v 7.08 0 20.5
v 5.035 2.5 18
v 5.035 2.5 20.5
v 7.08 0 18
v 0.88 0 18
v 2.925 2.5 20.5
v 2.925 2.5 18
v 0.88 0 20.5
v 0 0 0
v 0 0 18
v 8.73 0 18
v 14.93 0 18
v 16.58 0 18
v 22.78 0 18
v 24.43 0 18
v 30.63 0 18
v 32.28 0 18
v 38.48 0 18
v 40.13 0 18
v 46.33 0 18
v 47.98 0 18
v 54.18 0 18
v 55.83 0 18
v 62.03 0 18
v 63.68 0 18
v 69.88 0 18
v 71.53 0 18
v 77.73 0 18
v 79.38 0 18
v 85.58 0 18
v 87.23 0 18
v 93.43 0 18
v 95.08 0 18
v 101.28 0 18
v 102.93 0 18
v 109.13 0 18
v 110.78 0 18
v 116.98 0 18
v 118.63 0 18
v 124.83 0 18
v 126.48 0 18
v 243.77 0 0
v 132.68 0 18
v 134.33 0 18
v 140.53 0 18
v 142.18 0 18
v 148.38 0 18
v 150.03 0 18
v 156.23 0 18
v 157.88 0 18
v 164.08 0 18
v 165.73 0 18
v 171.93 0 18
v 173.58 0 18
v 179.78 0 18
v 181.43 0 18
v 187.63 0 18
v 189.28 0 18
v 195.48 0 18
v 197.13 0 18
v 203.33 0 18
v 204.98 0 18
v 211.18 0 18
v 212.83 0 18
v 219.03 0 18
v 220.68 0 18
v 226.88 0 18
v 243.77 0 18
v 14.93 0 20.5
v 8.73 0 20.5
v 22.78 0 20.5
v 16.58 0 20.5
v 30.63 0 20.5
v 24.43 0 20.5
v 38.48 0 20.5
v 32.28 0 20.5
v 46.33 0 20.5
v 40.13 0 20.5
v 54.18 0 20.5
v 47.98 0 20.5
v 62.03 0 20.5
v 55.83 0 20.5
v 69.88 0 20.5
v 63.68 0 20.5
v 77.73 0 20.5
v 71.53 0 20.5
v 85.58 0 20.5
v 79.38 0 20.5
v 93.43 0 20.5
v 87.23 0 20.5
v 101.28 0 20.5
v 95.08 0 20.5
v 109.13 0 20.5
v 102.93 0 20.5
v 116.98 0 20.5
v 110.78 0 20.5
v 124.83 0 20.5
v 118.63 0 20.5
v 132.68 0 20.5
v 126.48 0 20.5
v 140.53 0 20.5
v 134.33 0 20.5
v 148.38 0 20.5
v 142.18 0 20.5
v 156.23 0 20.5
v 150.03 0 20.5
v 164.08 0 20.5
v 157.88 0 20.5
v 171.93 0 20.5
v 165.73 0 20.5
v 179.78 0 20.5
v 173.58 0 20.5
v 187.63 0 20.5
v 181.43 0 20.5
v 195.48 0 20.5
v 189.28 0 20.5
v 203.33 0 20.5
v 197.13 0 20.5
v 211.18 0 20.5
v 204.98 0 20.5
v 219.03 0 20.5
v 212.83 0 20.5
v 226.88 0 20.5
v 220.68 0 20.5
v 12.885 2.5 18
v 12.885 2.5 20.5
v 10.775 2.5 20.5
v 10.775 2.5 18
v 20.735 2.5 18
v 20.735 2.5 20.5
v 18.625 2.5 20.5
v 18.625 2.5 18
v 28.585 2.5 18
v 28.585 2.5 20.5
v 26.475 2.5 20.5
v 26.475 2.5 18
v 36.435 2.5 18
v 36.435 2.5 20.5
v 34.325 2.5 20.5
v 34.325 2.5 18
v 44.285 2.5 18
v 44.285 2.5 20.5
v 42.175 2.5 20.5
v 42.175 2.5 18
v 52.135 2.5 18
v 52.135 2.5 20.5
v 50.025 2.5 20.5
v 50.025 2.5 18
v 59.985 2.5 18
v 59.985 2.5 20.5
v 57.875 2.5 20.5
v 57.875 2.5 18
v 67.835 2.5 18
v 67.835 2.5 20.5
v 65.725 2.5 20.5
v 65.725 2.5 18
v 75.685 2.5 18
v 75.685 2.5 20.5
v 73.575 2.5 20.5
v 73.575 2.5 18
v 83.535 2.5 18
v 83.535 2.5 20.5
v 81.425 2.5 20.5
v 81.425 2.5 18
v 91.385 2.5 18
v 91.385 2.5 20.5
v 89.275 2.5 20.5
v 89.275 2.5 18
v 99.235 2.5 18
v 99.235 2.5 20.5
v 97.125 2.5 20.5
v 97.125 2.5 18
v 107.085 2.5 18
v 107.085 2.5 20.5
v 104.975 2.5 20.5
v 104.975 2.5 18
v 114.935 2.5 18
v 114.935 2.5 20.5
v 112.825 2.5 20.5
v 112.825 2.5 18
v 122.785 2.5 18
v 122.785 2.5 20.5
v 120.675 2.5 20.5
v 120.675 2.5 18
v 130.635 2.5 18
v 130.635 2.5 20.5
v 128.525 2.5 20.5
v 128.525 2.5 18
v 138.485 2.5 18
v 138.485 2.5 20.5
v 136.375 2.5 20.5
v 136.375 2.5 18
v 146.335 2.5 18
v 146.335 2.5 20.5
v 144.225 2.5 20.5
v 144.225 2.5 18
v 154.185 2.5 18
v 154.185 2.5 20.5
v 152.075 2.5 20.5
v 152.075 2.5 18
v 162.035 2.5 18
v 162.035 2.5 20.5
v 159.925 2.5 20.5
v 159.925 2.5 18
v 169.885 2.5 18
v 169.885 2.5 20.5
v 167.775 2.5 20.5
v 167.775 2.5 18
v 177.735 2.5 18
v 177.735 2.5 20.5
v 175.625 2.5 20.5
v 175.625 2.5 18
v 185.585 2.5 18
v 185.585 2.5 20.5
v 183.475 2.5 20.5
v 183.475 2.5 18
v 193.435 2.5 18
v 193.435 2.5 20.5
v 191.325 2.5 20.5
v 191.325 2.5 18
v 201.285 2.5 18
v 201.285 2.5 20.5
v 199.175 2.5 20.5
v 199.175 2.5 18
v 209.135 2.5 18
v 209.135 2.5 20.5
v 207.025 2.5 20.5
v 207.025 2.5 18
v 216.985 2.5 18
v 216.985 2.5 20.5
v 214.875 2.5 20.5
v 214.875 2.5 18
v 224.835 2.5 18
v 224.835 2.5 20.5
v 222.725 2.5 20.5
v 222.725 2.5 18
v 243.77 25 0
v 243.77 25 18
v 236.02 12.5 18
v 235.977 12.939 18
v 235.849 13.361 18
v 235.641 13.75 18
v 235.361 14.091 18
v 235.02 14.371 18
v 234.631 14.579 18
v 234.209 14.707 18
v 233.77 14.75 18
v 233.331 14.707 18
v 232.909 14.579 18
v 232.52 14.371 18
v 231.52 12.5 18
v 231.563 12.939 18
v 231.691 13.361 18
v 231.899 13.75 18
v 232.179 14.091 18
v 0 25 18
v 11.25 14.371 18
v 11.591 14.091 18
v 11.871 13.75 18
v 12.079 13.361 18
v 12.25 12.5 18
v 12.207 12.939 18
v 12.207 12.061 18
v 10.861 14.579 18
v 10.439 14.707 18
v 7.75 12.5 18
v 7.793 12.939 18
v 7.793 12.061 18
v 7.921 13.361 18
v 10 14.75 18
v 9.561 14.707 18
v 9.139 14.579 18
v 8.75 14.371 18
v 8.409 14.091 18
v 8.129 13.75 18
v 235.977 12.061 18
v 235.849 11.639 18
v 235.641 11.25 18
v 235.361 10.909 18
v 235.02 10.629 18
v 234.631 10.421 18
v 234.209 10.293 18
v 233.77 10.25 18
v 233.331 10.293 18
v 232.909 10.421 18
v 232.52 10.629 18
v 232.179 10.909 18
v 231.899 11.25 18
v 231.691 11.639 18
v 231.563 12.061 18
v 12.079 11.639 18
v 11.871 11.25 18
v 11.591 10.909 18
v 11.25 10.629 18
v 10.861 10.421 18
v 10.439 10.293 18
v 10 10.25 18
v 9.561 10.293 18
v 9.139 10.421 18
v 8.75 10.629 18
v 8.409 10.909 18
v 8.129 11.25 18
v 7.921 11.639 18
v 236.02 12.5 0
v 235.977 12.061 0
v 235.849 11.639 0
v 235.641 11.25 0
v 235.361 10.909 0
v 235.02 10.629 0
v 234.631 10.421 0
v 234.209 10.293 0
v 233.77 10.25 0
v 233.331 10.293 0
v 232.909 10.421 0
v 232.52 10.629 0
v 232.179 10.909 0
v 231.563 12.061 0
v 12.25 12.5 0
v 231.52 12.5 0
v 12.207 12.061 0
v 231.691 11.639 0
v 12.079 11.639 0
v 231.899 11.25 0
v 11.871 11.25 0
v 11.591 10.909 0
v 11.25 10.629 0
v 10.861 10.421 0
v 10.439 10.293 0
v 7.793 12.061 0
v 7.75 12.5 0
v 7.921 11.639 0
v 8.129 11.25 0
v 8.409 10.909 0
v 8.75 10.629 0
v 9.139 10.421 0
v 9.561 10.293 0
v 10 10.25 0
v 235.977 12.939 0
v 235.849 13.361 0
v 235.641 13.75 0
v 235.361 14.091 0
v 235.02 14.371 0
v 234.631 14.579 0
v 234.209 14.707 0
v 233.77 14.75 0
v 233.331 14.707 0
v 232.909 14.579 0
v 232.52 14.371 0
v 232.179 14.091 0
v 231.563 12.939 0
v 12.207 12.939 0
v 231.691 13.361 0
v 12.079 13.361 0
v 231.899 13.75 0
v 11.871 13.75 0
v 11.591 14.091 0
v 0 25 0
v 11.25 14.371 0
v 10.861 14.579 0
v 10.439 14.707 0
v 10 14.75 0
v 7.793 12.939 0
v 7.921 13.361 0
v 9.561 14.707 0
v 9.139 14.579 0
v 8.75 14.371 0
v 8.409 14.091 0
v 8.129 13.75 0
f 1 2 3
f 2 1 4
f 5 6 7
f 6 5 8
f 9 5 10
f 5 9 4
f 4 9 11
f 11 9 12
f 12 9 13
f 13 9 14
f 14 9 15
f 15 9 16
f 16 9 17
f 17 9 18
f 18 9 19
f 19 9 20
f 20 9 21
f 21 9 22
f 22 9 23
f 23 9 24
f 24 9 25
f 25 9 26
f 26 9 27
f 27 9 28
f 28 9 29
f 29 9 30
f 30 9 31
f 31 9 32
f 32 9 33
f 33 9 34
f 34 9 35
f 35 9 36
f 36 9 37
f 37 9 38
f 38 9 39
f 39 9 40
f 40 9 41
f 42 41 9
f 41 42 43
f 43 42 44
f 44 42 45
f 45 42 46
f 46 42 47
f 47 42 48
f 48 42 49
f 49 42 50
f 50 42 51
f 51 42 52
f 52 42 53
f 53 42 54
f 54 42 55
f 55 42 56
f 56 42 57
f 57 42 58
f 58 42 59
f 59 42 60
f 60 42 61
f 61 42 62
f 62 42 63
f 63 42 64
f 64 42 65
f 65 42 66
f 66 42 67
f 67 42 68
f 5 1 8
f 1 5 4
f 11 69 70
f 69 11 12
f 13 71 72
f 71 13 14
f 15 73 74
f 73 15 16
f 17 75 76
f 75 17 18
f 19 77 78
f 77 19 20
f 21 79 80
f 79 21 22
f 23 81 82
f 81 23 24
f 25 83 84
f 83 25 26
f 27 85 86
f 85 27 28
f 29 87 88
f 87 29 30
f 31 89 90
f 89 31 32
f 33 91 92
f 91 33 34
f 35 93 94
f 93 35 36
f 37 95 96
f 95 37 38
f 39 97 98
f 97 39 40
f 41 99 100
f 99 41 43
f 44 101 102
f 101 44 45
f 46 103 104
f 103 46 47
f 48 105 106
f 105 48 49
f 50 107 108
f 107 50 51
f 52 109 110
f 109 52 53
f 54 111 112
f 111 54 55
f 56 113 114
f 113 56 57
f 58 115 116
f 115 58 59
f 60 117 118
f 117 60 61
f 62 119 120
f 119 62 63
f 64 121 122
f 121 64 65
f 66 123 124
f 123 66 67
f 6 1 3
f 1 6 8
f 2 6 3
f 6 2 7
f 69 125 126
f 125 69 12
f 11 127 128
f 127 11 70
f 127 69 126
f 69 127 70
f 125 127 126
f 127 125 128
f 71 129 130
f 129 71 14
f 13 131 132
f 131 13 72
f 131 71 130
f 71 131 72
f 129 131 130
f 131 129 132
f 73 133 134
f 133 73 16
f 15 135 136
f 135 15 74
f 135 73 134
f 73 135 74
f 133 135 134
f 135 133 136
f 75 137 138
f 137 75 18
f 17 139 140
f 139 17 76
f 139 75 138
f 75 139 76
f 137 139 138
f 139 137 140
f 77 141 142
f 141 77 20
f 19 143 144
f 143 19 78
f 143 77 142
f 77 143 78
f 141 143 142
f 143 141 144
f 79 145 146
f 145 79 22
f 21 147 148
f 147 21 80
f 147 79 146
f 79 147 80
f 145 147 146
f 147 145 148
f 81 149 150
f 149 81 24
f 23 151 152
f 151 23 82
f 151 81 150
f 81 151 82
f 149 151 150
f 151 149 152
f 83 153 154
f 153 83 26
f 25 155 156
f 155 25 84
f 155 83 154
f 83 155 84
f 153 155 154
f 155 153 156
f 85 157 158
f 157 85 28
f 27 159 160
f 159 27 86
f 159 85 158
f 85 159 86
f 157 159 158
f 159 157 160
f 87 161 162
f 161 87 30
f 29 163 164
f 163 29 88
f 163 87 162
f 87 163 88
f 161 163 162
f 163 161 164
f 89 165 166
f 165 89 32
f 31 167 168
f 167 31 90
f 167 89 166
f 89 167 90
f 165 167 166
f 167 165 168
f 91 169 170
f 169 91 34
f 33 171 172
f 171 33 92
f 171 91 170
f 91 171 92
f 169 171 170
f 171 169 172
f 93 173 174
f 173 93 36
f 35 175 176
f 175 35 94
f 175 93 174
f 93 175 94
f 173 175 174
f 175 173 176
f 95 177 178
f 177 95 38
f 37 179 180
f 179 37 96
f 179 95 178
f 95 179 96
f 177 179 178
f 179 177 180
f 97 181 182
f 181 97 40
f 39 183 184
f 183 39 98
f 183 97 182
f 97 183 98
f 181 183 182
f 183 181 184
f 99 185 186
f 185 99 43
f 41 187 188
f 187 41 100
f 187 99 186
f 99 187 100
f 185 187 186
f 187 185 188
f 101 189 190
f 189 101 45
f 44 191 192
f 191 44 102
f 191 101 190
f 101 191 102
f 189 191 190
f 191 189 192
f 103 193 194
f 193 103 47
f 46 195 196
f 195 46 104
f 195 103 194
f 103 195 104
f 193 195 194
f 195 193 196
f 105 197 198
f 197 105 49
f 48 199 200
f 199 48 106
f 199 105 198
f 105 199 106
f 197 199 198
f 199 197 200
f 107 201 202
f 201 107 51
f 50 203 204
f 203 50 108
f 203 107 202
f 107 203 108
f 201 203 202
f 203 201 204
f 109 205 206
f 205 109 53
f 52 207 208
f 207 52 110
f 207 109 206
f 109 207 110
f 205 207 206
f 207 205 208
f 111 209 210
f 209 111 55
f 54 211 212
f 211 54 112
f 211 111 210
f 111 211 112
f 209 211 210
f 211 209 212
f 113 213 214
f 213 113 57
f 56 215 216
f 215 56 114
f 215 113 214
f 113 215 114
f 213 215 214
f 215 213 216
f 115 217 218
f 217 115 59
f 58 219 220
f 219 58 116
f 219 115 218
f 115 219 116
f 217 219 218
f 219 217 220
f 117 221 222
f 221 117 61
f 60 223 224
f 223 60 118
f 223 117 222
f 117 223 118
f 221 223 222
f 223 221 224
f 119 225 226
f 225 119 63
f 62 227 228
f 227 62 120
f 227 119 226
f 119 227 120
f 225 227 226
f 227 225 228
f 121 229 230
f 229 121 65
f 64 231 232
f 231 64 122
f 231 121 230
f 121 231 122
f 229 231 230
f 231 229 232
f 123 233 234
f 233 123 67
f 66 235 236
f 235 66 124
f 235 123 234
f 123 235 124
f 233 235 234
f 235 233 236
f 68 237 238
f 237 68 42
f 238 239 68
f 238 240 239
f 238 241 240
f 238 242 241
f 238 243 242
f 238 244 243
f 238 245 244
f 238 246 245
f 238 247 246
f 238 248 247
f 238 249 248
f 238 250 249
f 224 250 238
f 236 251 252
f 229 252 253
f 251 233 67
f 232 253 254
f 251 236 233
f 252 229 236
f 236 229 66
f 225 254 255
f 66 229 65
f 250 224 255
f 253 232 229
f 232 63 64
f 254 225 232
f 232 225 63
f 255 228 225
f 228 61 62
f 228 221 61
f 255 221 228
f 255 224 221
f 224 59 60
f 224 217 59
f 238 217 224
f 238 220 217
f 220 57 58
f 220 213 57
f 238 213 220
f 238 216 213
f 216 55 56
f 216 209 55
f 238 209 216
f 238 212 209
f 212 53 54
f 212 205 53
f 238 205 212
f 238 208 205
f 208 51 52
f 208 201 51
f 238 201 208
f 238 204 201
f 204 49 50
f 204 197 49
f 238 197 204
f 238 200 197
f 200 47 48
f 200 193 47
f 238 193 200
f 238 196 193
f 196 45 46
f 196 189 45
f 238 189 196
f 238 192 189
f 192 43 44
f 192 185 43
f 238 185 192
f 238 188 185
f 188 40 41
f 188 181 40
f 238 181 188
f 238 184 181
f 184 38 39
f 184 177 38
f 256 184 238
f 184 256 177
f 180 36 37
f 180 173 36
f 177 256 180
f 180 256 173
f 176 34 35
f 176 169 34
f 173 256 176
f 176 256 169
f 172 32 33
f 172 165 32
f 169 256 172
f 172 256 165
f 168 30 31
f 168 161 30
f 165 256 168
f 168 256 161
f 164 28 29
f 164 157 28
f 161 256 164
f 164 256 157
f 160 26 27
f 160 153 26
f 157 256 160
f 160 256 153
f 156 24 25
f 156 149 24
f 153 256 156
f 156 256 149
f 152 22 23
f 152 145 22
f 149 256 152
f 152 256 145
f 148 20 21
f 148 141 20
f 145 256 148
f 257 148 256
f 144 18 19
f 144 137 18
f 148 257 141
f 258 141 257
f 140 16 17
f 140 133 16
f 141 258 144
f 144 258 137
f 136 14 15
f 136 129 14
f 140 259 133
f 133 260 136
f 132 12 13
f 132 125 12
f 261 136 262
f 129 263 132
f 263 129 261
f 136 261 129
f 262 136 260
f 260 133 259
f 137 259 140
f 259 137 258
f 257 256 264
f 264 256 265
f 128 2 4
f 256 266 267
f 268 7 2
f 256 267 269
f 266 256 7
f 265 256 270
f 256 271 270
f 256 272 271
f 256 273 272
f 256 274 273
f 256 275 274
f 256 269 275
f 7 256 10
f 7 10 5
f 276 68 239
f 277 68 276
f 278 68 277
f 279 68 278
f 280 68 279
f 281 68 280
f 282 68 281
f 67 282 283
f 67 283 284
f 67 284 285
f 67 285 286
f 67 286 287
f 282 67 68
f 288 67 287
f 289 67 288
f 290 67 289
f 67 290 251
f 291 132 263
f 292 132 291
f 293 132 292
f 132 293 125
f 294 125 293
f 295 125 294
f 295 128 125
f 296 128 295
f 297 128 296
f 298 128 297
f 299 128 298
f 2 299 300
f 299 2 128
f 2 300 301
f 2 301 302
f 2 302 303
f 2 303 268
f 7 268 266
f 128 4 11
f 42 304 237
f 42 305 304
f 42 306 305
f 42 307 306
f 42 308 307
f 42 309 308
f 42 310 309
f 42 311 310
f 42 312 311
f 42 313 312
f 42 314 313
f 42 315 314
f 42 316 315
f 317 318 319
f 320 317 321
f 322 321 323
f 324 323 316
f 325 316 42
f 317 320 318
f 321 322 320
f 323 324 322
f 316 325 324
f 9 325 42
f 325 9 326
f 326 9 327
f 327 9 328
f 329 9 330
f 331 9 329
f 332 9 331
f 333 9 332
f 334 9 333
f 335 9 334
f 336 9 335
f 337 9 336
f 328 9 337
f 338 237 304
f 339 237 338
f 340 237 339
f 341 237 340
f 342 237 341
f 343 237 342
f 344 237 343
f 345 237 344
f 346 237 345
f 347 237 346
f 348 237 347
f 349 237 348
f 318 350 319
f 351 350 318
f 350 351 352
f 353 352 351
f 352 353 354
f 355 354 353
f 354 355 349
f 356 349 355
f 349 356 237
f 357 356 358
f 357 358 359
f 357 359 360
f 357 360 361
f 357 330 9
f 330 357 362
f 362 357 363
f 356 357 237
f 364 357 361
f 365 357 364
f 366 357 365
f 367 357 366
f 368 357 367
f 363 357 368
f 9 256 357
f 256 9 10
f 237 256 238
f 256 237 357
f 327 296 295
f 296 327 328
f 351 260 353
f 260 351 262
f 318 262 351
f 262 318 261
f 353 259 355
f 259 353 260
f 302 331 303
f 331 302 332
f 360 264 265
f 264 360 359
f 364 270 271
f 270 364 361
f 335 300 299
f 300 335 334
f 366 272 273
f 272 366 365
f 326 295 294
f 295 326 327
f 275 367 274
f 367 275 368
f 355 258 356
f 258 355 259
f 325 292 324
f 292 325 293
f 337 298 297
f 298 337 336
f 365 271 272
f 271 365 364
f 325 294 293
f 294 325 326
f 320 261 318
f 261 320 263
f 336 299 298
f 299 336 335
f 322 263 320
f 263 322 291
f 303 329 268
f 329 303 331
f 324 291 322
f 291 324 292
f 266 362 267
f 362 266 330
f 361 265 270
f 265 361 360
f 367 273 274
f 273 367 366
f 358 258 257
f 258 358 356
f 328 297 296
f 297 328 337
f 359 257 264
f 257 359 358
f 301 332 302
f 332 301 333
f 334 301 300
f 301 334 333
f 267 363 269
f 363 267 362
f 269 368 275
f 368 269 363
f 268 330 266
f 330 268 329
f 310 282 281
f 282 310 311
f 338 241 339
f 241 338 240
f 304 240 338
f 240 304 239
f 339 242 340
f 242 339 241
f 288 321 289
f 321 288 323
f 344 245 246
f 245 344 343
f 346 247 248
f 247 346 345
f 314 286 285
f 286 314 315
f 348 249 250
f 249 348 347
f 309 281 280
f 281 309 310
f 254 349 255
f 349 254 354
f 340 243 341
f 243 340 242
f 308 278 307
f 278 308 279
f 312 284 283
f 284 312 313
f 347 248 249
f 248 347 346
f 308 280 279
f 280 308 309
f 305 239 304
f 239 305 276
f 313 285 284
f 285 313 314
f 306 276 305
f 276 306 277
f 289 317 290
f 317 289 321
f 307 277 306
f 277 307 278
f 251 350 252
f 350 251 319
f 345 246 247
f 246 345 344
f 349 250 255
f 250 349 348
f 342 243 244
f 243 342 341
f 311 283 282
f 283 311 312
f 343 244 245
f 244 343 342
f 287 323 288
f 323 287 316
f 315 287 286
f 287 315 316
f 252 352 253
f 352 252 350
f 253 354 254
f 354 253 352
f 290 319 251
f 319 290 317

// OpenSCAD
$fn = 32;

// ----------------------------------------------------------------------
// Gear rack: m=2.5 z=29, 243.77 x 25 x 20.5 mm
// ----------------------------------------------------------------------

// --- parameters (mm) ---
rack_len = 243.77;        // rack length, X
rack_w = 25;              // rack width, Y
rack_h = 20.5;            // overall height, Z
modul = 2.5;              // module
body_t = 18;              // tooth root line height
pitch = 7.85;             // circular pitch
tip_w = 2.11;             // tooth thickness at the tip
root_w = 6.2;             // tooth thickness at the root line
hole_d = 4.5;             // mounting hole
sink = 0.6;               // tooth root overlap into the body

tooth_span = 227.76;

module tooth(x0) {
  /* 20 deg flank profile, sunk into the body for a positive overlap */
  translate([x0, 0, body_t - sink])
    linear_extrude(height = rack_h - body_t + sink)
      polygon(points = [[-root_w / 2, 0], [root_w / 2, 0],
                        [tip_w / 2, rack_h - body_t],
                        [-tip_w / 2, rack_h - body_t]]);
}

difference() {
  union() {
    cube([rack_len, rack_w, body_t]);
    for (i = [0 : 29 - 1])
      tooth((i + 0.5) * pitch + (tooth_span - 29 * pitch) / 2);
  }
  translate([10, 12.5, -1]) cylinder(h = body_t + 2, d = hole_d);
  translate([233.77, 12.5, -1]) cylinder(h = body_t + 2, d = hole_d);
}
